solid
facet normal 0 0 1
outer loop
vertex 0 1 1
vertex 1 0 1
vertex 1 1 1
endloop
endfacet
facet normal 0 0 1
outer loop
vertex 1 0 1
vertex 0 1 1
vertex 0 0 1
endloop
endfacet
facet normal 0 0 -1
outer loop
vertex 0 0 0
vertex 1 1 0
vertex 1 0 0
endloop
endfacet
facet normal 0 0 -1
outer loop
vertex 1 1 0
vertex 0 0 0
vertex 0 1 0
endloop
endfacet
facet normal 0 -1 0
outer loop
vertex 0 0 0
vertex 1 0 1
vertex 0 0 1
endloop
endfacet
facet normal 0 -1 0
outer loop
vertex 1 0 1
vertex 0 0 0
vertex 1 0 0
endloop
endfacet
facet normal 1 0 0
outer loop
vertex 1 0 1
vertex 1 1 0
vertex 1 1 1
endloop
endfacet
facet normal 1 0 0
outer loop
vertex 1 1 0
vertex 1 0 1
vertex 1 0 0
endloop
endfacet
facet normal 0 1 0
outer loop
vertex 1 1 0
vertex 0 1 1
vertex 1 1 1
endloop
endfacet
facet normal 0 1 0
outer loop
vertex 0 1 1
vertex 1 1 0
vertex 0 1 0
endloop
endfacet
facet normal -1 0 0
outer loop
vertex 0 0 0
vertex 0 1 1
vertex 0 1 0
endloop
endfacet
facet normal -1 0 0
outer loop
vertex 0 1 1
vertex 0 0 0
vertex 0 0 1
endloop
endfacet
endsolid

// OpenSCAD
module child1() {
	echo("child1");
}
module child2() {
	echo("child2");
}
module child3() {
	echo("child3");
}
module child4() {
	echo("child4");
}
module child5() {
	echo("child5");
}

module test_children_empty() {
	echo("Children empty: begin");
	children();
	echo("Children empty: end");
}
test_children_empty() {
	child1();child2();child3();child4();child5();
}

module test_children_scalar() {
	echo("Children scalar: begin");
	children(0); // child1
	children(4); // child5
	children(2); // child3
	children(5); // out
	children(-1); // out
	echo("Children scalar: end");
}
test_children_scalar() {
	child1();child2();child3();child4();child5();
}

module test_children_vector() {
	echo("Children vector: begin");
	children([4]); // child5 last
	children([0,3,1]); // child1, child4, child2
	children([5,-1]); // out, out
	echo("Children vector: end");
}
test_children_vector() {
	child1();child2();child3();child4();child5();
}

module test_children_range() {
	echo("Children range: begin");
	children([0:4]); // all
	children([1:2]); // child2, child3
	children([0:2:4]); // child1, child3, child5
	children([4:-1:0]); // out, out
	echo("Children range: end");
}
test_children_range() {
	child1();child2();child3();child4();child5();
}

// to avoid no object error
cube(1.0);
